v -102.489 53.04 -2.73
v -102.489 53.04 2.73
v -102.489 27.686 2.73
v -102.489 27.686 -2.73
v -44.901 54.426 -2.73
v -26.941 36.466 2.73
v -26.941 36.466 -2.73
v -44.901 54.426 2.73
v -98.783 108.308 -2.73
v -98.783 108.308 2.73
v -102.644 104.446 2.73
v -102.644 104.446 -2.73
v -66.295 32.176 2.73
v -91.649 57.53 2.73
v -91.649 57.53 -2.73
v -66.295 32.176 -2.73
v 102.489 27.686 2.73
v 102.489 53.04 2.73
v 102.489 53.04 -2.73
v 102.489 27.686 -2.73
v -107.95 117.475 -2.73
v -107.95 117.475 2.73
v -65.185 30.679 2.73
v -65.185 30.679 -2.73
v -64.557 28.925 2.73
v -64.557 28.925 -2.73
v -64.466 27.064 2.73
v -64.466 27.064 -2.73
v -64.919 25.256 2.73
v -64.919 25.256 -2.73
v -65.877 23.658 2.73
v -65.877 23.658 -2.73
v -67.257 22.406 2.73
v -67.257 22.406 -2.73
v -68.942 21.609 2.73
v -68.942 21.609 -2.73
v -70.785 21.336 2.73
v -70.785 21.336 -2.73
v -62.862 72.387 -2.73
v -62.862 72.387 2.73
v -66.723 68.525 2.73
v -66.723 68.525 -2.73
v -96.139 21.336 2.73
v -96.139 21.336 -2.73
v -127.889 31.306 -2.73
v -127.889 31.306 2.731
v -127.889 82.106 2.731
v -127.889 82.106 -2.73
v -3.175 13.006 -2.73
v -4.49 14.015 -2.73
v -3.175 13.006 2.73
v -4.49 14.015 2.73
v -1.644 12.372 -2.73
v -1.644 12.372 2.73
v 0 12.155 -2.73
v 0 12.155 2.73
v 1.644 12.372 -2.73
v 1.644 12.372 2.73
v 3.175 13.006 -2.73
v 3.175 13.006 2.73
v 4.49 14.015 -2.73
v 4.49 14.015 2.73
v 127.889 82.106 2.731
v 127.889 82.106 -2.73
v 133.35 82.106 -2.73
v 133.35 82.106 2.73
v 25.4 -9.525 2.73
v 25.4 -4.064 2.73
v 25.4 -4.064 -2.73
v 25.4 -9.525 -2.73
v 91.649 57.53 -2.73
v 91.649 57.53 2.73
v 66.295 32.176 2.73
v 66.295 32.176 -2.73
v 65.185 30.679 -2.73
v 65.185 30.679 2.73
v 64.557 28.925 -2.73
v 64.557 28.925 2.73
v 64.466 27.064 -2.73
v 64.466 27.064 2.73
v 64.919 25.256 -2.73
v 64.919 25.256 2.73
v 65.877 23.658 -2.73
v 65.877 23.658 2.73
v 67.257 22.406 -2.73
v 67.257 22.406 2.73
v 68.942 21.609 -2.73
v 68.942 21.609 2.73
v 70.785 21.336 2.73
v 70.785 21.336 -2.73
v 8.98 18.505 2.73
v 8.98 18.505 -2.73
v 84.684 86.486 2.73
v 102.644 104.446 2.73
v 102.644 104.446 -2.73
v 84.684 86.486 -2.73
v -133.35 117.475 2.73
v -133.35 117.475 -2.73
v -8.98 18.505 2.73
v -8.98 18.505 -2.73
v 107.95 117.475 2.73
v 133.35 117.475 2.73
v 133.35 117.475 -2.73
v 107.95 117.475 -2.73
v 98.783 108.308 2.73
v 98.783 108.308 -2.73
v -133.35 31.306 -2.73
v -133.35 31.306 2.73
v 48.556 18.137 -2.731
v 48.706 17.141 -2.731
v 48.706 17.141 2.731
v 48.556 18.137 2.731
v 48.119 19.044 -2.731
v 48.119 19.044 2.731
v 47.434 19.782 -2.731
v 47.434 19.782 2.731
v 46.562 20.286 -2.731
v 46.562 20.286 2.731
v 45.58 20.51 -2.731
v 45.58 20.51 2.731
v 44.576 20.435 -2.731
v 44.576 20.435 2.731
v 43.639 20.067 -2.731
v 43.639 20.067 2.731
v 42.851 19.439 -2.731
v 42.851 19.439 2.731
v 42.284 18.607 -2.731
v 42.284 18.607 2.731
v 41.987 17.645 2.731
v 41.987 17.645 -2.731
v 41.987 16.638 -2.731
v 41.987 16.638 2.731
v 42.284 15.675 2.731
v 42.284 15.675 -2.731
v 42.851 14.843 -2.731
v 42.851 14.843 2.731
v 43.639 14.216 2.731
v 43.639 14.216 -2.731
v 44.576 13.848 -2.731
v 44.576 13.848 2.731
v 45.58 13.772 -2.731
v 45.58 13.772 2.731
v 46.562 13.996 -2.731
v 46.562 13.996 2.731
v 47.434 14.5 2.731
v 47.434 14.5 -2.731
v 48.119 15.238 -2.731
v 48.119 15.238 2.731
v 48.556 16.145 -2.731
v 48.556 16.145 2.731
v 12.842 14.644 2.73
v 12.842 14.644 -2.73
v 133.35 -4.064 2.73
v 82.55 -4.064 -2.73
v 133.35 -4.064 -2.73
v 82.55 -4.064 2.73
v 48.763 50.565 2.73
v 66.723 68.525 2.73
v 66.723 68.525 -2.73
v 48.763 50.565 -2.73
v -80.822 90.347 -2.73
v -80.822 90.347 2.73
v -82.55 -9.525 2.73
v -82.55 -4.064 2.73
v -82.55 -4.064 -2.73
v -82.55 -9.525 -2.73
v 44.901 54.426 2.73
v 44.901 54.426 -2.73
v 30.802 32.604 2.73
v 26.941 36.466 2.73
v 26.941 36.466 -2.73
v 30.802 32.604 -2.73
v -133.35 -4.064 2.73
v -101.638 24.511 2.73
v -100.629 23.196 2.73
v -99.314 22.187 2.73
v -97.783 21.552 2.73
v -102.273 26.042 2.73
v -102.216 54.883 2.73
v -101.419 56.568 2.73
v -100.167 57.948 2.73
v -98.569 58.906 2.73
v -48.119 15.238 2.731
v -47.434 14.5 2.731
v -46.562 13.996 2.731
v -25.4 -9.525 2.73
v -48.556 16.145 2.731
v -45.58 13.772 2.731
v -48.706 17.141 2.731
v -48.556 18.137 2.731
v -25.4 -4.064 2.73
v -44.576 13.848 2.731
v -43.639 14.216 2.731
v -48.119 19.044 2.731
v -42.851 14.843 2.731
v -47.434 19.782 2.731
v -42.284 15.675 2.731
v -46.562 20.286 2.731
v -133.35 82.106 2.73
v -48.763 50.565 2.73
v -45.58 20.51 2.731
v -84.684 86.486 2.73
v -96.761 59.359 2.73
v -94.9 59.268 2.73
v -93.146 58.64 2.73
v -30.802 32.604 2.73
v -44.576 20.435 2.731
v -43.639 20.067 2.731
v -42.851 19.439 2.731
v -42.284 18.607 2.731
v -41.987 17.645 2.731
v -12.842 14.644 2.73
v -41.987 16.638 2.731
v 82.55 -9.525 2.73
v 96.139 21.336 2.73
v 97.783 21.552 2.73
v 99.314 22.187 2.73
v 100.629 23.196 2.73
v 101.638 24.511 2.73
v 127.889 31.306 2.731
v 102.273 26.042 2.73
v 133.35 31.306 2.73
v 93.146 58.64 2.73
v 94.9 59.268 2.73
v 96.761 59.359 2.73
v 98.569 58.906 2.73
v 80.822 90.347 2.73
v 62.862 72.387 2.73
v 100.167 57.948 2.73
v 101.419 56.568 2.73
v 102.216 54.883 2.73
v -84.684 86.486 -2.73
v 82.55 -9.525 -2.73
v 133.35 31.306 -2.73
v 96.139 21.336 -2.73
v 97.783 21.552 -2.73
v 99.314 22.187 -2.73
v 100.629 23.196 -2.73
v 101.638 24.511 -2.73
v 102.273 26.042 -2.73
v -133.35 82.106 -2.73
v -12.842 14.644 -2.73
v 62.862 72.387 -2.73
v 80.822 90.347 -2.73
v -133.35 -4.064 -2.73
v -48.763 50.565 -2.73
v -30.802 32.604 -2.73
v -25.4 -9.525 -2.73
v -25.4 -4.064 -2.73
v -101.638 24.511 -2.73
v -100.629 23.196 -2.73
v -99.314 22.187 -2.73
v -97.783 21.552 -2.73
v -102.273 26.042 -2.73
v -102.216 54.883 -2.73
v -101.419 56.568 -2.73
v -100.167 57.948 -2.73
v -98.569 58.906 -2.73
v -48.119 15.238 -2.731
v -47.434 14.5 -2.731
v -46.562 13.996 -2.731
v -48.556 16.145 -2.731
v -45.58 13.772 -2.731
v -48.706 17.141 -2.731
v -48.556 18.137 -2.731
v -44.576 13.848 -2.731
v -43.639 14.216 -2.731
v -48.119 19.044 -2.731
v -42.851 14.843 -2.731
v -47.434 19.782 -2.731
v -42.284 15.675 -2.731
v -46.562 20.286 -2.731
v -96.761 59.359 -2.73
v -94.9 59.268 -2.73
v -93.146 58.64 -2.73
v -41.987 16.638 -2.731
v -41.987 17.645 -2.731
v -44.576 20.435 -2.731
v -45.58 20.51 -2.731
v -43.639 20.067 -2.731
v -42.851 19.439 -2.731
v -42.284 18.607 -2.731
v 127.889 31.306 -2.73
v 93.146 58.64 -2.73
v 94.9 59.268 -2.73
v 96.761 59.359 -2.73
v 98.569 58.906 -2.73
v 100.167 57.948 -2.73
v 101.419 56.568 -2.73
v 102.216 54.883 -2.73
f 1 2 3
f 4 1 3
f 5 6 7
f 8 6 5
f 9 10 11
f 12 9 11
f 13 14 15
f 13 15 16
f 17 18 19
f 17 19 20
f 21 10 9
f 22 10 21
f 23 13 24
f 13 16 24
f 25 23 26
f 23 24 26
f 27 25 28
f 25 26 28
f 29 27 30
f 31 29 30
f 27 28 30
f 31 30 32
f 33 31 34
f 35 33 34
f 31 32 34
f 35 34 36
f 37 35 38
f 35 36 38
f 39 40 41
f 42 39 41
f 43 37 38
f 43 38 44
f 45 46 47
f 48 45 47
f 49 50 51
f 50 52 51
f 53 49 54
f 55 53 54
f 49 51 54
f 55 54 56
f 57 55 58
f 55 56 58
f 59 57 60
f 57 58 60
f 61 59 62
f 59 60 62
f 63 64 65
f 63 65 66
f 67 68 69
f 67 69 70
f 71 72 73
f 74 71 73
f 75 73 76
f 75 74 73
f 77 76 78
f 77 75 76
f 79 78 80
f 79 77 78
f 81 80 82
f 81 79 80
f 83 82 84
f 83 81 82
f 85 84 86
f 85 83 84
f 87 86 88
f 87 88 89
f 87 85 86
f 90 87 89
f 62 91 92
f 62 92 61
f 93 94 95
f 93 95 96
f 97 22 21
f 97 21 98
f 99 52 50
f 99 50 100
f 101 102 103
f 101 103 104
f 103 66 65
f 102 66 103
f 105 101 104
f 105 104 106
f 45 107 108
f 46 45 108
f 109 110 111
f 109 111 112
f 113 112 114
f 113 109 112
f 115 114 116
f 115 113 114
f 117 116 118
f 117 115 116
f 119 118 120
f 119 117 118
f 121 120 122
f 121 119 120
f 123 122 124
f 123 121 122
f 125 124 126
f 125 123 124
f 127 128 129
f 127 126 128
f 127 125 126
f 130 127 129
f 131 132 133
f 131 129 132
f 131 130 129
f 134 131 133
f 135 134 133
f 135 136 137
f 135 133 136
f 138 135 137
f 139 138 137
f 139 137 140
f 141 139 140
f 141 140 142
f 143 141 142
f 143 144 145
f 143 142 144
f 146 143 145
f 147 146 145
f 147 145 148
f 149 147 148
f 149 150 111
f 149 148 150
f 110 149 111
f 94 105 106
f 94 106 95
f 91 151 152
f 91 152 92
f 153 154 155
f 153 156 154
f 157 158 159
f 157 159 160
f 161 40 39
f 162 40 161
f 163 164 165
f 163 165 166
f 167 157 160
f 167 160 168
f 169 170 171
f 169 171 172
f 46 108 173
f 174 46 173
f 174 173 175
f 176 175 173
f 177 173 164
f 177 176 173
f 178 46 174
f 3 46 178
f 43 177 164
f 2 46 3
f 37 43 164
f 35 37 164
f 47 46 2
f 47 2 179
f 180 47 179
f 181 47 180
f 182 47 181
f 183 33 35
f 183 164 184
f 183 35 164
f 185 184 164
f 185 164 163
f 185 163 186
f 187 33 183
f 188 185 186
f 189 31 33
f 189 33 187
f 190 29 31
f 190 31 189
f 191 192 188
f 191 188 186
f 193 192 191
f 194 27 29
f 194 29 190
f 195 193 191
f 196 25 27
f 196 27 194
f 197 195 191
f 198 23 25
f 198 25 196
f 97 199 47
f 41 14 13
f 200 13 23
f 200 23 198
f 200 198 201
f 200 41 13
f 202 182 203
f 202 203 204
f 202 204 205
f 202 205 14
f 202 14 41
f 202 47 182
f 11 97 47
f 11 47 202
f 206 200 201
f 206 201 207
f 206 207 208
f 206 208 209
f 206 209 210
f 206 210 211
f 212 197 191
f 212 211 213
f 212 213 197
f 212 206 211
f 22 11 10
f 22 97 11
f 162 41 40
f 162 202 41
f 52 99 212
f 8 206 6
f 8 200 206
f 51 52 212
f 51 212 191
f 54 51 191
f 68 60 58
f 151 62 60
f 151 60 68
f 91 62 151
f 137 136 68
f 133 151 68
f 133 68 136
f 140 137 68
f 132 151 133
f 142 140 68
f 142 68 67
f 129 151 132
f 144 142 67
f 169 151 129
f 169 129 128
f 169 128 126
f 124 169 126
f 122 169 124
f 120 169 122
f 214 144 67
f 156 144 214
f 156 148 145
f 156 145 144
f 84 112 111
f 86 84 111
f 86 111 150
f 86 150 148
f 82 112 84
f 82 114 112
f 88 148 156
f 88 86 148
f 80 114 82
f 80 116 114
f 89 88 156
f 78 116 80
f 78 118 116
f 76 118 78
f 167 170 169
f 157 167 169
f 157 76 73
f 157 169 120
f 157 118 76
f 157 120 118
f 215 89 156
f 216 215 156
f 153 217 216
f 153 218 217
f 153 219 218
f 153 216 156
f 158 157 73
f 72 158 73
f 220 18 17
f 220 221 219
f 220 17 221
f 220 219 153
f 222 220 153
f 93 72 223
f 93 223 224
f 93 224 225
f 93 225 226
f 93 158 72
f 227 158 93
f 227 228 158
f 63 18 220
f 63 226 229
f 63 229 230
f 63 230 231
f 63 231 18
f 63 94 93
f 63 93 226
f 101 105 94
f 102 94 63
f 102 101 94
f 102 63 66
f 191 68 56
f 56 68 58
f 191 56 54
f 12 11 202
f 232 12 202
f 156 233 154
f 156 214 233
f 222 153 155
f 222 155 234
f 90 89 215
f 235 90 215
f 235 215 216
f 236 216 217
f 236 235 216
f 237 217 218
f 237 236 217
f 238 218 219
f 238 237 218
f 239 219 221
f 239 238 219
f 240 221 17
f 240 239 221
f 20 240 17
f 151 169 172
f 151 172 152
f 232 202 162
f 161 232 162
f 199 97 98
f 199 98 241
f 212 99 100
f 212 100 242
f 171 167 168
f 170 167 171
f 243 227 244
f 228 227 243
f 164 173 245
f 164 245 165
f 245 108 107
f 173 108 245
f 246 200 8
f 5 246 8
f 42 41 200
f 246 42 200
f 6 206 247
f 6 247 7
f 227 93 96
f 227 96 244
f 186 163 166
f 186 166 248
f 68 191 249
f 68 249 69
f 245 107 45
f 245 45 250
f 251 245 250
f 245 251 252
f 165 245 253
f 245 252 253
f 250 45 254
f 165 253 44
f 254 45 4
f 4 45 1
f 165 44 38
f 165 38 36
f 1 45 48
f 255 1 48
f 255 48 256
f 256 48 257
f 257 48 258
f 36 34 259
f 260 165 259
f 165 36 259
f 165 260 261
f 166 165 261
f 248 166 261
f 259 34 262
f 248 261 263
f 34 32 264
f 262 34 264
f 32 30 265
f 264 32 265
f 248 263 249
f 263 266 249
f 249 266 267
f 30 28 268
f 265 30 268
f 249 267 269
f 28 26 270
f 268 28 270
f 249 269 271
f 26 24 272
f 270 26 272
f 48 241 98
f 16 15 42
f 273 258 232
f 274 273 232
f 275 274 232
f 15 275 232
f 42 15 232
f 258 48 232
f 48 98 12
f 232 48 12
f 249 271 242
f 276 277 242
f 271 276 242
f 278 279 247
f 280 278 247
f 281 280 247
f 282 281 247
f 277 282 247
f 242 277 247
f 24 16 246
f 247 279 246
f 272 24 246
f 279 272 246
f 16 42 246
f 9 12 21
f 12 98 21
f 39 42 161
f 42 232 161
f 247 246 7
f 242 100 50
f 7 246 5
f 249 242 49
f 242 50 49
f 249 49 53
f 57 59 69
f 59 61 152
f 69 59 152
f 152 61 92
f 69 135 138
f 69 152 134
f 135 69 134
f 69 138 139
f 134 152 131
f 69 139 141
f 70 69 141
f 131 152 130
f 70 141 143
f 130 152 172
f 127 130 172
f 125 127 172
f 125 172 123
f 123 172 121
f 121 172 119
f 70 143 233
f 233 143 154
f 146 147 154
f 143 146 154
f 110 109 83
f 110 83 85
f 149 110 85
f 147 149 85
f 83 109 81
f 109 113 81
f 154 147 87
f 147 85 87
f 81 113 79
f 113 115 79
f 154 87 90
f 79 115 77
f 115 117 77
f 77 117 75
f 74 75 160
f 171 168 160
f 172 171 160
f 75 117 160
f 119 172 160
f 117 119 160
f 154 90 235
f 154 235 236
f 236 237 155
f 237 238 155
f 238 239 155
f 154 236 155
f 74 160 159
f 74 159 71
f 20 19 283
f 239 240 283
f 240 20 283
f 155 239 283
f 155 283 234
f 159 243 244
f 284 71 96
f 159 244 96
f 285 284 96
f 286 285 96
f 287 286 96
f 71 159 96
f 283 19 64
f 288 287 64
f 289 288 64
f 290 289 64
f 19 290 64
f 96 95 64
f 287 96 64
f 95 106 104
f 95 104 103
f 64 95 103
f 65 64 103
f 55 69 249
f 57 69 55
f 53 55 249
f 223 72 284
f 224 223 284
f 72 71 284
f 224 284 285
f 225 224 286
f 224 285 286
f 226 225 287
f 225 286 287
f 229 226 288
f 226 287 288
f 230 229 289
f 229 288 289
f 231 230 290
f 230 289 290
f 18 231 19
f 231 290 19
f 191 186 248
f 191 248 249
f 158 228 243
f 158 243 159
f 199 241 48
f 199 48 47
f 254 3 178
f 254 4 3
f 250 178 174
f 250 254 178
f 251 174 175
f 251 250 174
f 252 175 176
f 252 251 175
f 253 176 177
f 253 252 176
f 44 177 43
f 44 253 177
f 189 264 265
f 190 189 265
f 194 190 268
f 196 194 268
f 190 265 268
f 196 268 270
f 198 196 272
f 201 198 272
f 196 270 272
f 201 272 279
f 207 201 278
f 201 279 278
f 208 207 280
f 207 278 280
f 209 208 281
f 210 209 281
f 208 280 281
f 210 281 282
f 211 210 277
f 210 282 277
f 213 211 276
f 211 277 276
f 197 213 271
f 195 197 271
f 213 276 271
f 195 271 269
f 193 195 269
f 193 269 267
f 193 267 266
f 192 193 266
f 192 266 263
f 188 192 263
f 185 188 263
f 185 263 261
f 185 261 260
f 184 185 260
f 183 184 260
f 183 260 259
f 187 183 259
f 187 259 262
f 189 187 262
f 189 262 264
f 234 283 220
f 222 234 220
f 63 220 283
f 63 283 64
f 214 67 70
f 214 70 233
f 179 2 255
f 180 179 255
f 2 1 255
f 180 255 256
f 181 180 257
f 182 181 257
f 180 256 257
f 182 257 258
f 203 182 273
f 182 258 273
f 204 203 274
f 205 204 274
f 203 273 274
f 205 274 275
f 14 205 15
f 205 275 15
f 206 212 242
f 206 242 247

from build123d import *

# Parameters (mm, degrees)
BOSS_EXTRUDE1_DEPTH     = 2.7305
CUT_EXTRUDE1_DEPTH      = 178.79882071
CAVITY1_START           = -133.35
CAVITY1_OUTLINE_W       = 50.8
CAVITY1_OUTLINE_H       = 5.461
CAVITY1_DEPTH           = 5.461
CAVITY1_START_2         = 127.889
CAVITY1_2_OUTLINE_W     = 50.8
CAVITY1_2_OUTLINE_H     = 5.461
CAVITY1_2_DEPTH         = 5.461
FILLET1_R               = 6.35
SKETCH3_W               = 5.461
SKETCH3_H               = 50.8
CUT_EXTRUDE2_DEPTH      = 178.79882071
FILLET2_R               = 6.35
F_1_4_CLEARANCE_HOLE1_D = 6.7564


# Read off the part's stored shape, not the designer's step: Cavity1
with BuildPart() as part:
    # Sketch1 → Boss-Extrude1 (new, symmetric)
    with BuildSketch(Plane.XY):
        Polygon((133.35, -4.064), (133.35, 117.475), (107.95, 117.475), (0, 9.525), (-107.95, 117.475), (-133.35, 117.475), (-133.35, -4.064), (-82.55, -4.064), (-82.55, -9.525), (-25.4, -9.525), (-25.4, -4.064), (25.4, -4.064), (25.4, -9.525), (82.55, -9.525), (82.55, -4.064), align=None)
    extrude(amount=BOSS_EXTRUDE1_DEPTH, both=True)

    # Sketch2 → Cut-Extrude1 (cut, through all)
    with BuildSketch(Plane.XY.offset(2.7305)):
        Polygon((-8.980256121, 18.505256121), (-12.841766253, 14.643745989), (-30.802278495, 32.604258231), (-26.940768363, 36.465768363), align=None)
        Polygon((-62.861792847, 72.386792847), (-66.72330298, 68.525282715), (-48.762790737, 50.564770473), (-44.901280605, 54.426280605), align=None)
        Polygon((-98.782817332, 108.307817332), (-102.644327464, 104.4463072), (-84.683815222, 86.485794958), (-80.82230509, 90.34730509), align=None)
        Polygon((80.82230509, 90.34730509), (98.782817332, 108.307817332), (102.644327464, 104.4463072), (84.683815222, 86.485794958), align=None)
        Polygon((44.901280605, 54.426280605), (62.861792847, 72.386792847), (66.72330298, 68.525282715), (48.762790737, 50.564770473), align=None)
        Polygon((26.940768363, 36.465768363), (30.802278495, 32.604258231), (12.841766253, 14.643745989), (8.980256121, 18.505256121), align=None)
    extrude(amount=-CUT_EXTRUDE1_DEPTH, mode=Mode.SUBTRACT)

    # Cavity1 outline → Cavity1 (cut)
    with BuildSketch(Plane.YZ.offset(CAVITY1_START)):
        with Locations((56.7055, 0)):
            Rectangle(CAVITY1_OUTLINE_W, CAVITY1_OUTLINE_H)
    extrude(amount=CAVITY1_DEPTH, mode=Mode.SUBTRACT)

    # Cavity1 2 outline → Cavity1 2 (cut)
    with BuildSketch(Plane.YZ.offset(CAVITY1_START_2)):
        with Locations((56.7055, 0)):
            Rectangle(CAVITY1_2_OUTLINE_W, CAVITY1_2_OUTLINE_H)
    extrude(amount=CAVITY1_2_DEPTH, mode=Mode.SUBTRACT)

    # Fillet1
    fillet1_edges = [part.edges().sort_by_distance(p)[0] for p in [
        (0, 9.525, 0),
    ]]
    fillet(fillet1_edges, radius=FILLET1_R)

    # Sketch3 → Cut-Extrude2 (cut, through all)
    with BuildSketch(Plane.XY.offset(2.7305)):
        with Locations((-130.6195, 56.7055)):
            Rectangle(SKETCH3_W, SKETCH3_H)
        Polygon((-102.489, 68.369955252), (-55.455044748, 21.336), (-102.489, 21.336), (-102.489, 31.3055), align=None)
    cut_extrude2 = extrude(amount=-CUT_EXTRUDE2_DEPTH, mode=Mode.SUBTRACT)

    # Mirror1: Cut-Extrude2 across plane
    add(cut_extrude2.mirror(Plane(origin=(0, 0, 0), x_dir=(0, 0, 1), z_dir=(1, 0, 0))), mode=Mode.SUBTRACT)

    # Fillet2
    fillet2_edges = [part.edges().sort_by_distance(p)[0] for p in [
        (-55.455044748, 21.336, 0),
        (-102.489, 21.336, 0),
        (-102.489, 68.369955252, 0),
        (102.489, 21.336, 0),
        (55.455044748, 21.336, 0),
        (102.489, 68.369955252, 0),
    ]]
    fillet(fillet2_edges, radius=FILLET2_R)

    # 1/4 Clearance Hole1 (through all)
    with Locations(Plane.XY.offset(2.7305)):
        with Locations((-45.327694765, 17.141114286)):
            f_1_4_clearance_hole1 = Hole(F_1_4_CLEARANCE_HOLE1_D / 2)

    # Mirror2: 1/4 Clearance Hole1 across plane
    add(f_1_4_clearance_hole1.mirror(Plane(origin=(0, 0, 0), x_dir=(0, 0, 1), z_dir=(1, 0, 0))), mode=Mode.SUBTRACT)


solid = part.part
